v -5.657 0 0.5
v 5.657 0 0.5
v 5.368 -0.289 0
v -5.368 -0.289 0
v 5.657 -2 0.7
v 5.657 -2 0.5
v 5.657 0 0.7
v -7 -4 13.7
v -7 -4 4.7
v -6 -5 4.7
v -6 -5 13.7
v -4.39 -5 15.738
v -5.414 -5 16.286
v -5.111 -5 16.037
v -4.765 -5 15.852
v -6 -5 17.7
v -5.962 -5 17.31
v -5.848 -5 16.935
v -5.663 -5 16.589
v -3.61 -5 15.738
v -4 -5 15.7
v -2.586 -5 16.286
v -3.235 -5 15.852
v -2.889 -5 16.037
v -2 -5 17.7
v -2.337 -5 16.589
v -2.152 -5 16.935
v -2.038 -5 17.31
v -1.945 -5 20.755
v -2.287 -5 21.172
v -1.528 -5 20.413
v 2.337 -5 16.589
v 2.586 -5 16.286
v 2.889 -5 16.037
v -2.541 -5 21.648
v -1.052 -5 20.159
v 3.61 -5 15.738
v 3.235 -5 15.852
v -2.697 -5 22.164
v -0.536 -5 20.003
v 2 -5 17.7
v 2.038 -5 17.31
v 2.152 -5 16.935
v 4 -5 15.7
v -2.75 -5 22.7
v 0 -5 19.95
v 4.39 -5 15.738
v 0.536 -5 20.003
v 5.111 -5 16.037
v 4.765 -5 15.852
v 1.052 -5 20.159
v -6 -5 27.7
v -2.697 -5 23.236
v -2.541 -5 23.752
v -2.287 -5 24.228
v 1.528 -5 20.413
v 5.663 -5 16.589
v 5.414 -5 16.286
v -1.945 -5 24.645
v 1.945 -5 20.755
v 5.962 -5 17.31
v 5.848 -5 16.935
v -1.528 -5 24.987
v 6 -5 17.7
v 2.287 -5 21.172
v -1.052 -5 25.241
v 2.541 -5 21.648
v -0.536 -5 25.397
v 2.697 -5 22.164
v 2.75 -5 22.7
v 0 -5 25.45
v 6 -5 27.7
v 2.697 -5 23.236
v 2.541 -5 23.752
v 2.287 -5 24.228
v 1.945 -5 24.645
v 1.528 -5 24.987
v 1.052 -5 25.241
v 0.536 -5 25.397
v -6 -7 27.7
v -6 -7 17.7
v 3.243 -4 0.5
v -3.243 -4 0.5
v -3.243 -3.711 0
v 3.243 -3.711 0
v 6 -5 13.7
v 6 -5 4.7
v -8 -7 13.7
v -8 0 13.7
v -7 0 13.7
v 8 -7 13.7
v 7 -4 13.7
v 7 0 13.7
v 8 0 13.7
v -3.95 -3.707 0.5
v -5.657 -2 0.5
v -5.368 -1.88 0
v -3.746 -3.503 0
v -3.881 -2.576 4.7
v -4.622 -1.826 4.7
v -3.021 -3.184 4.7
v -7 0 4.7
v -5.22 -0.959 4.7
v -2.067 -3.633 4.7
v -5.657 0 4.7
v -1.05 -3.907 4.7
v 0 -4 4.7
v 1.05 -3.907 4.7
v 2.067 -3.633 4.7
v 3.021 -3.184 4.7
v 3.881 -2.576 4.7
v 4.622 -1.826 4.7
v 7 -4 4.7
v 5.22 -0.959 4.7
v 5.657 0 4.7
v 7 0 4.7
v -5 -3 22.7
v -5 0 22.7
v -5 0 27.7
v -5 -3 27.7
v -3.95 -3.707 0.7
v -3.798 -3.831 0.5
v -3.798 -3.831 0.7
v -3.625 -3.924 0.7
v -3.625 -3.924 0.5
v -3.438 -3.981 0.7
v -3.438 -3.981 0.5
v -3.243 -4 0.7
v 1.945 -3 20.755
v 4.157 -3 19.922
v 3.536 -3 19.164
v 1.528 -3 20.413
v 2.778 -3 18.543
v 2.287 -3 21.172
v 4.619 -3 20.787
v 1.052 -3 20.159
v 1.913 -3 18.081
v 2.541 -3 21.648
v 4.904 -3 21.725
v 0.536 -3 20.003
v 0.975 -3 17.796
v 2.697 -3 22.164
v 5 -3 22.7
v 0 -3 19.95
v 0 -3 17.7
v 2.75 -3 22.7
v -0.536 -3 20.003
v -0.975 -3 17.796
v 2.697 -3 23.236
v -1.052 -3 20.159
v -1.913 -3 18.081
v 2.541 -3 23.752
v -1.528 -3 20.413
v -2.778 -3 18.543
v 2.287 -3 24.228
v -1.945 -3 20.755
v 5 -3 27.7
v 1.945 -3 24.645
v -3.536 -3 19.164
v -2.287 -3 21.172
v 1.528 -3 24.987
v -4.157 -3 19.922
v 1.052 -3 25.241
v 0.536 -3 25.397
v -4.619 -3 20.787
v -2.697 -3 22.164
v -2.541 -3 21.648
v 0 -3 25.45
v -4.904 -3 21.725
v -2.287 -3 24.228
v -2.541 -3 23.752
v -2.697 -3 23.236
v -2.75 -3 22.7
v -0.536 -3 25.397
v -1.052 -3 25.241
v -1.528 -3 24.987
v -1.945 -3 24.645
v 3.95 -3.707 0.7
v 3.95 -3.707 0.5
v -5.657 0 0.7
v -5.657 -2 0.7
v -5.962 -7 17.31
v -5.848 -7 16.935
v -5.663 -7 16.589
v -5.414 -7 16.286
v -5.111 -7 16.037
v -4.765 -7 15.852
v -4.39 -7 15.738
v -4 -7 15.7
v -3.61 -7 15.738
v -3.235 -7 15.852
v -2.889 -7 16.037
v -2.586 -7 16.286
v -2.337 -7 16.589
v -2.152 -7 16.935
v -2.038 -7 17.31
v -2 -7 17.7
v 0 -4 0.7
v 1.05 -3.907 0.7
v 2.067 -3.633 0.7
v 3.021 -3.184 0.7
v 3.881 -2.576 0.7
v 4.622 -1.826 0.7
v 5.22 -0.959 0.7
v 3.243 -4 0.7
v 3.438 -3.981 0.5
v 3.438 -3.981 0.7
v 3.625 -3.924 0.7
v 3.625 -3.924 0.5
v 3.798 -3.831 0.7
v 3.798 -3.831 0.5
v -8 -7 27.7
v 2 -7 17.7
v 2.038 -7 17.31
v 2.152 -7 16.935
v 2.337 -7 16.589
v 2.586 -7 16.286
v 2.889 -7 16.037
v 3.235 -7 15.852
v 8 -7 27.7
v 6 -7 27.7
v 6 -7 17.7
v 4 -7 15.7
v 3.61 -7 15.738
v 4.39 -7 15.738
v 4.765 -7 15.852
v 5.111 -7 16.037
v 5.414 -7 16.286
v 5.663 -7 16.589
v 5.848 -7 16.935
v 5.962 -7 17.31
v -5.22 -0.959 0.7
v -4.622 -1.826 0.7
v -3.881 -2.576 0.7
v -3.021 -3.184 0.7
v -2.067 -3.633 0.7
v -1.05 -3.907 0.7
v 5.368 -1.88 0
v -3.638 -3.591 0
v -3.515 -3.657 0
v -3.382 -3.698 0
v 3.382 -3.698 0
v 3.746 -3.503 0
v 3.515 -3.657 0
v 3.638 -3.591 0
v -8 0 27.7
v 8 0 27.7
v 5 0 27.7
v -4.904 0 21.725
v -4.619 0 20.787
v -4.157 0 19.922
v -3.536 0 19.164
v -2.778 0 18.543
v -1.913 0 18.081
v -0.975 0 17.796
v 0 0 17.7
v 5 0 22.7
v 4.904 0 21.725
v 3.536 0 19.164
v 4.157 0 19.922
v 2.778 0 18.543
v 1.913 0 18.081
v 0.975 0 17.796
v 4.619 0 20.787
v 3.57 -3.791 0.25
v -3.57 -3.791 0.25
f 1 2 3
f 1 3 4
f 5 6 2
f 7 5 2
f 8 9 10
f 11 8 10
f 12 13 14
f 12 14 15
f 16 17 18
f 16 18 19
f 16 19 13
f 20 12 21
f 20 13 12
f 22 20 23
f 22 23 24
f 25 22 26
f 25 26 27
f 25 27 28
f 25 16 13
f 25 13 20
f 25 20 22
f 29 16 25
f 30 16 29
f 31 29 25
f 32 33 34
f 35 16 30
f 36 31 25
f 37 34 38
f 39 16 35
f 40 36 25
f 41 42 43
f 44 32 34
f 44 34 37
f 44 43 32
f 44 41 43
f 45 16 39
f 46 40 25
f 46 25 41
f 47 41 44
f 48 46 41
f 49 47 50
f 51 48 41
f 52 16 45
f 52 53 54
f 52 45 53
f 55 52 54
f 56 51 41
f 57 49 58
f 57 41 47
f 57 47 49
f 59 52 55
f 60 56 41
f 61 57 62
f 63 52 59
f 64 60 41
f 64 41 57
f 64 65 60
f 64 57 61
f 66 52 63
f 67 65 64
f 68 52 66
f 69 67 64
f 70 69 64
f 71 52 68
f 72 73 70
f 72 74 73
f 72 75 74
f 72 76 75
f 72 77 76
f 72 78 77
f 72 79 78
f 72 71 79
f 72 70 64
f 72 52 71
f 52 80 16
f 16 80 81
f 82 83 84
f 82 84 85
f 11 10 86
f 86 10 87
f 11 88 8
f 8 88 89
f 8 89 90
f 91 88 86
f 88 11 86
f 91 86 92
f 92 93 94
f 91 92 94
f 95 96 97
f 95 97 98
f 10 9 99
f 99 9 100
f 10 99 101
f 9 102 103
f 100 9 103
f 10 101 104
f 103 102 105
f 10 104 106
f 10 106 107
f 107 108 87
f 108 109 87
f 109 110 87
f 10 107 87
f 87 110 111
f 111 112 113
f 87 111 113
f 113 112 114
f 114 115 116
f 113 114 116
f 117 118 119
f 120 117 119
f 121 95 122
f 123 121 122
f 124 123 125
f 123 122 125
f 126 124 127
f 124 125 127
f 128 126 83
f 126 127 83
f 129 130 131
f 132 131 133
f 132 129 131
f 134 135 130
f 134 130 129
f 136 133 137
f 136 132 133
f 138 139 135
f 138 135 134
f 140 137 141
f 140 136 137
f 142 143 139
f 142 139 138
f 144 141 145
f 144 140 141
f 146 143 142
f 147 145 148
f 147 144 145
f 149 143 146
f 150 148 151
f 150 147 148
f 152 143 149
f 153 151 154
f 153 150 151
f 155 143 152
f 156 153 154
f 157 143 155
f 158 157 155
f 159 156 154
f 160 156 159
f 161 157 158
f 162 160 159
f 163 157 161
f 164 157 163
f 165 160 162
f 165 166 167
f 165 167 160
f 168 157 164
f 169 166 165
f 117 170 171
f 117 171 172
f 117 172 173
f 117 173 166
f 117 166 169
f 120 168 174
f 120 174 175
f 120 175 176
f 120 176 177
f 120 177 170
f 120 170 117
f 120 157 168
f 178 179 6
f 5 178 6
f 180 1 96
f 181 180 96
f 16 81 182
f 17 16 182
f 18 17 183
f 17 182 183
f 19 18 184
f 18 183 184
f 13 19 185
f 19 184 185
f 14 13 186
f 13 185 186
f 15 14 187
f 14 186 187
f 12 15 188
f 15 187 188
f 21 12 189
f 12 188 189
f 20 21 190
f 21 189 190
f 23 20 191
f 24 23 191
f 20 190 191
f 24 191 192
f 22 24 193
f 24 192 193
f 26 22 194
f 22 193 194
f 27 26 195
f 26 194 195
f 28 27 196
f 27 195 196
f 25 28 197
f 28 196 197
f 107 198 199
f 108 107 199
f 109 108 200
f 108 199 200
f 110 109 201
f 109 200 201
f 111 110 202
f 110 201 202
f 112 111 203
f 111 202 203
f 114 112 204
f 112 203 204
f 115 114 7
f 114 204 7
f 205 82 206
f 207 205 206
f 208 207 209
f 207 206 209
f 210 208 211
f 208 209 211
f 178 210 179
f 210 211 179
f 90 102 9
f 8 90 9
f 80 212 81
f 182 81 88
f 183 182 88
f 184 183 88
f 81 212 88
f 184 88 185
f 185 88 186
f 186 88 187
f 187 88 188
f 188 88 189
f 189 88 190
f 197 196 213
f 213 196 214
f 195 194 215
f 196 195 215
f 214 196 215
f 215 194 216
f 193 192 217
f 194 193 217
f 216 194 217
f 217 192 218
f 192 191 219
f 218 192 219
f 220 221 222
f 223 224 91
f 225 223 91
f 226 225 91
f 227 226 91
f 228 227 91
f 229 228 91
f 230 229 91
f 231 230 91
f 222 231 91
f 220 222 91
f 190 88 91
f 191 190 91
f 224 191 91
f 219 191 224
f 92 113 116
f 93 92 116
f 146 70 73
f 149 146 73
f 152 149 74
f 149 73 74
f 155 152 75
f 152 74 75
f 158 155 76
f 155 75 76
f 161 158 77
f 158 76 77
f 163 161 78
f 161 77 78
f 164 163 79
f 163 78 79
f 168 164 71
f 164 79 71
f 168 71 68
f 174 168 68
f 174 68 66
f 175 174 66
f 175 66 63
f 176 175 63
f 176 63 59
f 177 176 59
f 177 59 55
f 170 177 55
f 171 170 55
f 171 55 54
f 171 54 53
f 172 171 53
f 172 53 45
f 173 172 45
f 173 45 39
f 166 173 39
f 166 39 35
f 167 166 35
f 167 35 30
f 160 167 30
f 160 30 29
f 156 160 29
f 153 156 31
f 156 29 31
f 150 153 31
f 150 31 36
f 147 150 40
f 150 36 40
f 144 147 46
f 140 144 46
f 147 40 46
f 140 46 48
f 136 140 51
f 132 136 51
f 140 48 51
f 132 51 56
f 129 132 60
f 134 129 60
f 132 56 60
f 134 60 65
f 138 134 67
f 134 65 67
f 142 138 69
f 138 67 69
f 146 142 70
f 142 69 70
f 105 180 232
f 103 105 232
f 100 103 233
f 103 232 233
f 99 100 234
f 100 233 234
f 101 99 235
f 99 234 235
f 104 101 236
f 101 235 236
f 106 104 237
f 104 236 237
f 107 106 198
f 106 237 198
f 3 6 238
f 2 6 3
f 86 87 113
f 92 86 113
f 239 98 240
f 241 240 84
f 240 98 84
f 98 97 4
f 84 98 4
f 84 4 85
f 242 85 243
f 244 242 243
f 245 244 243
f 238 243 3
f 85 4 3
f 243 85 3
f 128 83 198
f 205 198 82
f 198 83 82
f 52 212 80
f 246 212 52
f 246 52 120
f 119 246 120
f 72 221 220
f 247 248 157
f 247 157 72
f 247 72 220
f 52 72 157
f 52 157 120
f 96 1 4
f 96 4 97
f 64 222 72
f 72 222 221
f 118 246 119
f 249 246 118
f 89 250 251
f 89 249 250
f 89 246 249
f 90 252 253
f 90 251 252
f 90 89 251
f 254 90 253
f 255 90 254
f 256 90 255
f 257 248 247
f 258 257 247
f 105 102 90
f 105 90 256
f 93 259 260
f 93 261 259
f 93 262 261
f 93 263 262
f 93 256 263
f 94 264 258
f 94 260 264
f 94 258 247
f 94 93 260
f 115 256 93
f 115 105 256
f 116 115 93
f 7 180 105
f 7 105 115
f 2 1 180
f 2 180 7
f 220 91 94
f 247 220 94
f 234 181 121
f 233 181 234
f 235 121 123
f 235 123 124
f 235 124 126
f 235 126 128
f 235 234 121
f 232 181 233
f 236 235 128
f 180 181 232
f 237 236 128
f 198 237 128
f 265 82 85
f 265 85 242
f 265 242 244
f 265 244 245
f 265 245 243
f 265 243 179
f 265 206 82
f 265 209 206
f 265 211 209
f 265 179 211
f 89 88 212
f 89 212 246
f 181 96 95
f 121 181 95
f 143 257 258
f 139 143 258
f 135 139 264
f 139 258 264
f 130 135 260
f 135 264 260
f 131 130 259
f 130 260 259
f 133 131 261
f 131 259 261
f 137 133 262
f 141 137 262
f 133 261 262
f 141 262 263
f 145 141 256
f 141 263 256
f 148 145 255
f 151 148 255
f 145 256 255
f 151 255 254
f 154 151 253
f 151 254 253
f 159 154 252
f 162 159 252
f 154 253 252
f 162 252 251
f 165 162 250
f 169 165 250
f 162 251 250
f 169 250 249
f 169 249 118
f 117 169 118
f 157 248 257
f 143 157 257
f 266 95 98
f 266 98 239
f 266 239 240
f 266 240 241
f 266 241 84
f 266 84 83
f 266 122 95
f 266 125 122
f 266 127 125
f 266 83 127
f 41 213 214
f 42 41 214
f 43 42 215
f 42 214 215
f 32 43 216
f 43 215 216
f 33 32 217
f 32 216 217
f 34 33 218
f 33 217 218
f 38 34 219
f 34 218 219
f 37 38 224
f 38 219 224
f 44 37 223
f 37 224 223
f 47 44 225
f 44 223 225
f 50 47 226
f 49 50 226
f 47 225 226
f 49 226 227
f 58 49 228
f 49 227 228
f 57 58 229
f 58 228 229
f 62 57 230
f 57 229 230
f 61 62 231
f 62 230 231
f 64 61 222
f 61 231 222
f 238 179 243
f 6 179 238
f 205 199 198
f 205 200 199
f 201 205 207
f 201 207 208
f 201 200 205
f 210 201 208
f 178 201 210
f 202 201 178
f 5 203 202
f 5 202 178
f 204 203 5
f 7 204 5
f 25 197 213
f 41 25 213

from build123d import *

# Parameters (mm, degrees)
F1_DEPTH  = 0.7
F3_DEPTH  = 4
F5_DEPTH  = 9
F6_W      = 16
F6_H      = 7
F7_DEPTH  = 14
F8_R      = 2.75
F9_DEPTH  = 7.001
F10_R     = 2.75
F11_DEPTH = 2
F12_R     = 2.75
F13_DEPTH = 3
F14_SIZE2 = 0.5
F14_SIZE  = 0.2886751346


with BuildPart() as f1:
    # F0 (on Top) → F1 (new body)
    with BuildSketch(Plane.XY):
        with BuildLine():
            Line((5.657, 0), (-5.657, 0))
            ThreePointArc((-5.657, 0), (-3.4641611178, -2.8989837358), (0, -4))
            ThreePointArc((0, -4), (3.4641611178, -2.8989837358), (5.657, 0))
        make_face()
        with BuildLine():
            ThreePointArc((0, -4), (-3.4641611178, -2.8989837358), (-5.657, 0))
            Line((-5.657, 0), (-5.657, -2))
            Line((-5.657, -2), (-3.9498932188, -3.7071067812))
            ThreePointArc((-3.9498932188, -3.7071067812), (-3.62546987, -3.9238795325), (-3.2427864376, -4))
            Line((-3.2427864376, -4), (0, -4))
        make_face()
        with BuildLine():
            Line((5.657, -2), (5.657, 0))
            ThreePointArc((5.657, 0), (3.4641611178, -2.8989837358), (0, -4))
            Line((0, -4), (3.2427864376, -4))
            ThreePointArc((3.2427864376, -4), (3.62546987, -3.9238795325), (3.9498932188, -3.7071067812))
            Line((3.9498932188, -3.7071067812), (5.657, -2))
        make_face()
    extrude(amount=F1_DEPTH)

    # F2 (on face) → F3 (join)
    with BuildSketch(Plane.XY.offset(0.7)):
        with BuildLine():
            Line((5.657, 0), (-5.657, 0))
            ThreePointArc((-5.657, 0), (-3.4641611178, -2.8989837358), (0, -4))
            ThreePointArc((0, -4), (3.4641611178, -2.8989837358), (5.657, 0))
        make_face()
    extrude(amount=F3_DEPTH)

    # F4 (on face) → F5 (join)
    with BuildSketch(Plane.XY.offset(4.7)):
        with BuildLine():
            Line((5.657, 0), (-5.657, 0))
            ThreePointArc((-5.657, 0), (0, -4), (5.657, 0))
        make_face()
        with BuildLine():
            Line((-5.657, 0), (-7, 0))
            Line((-7, 0), (-7, -4))
            Line((-7, -4), (-6, -5))
            Line((-6, -5), (6, -5))
            Line((6, -5), (7, -4))
            Line((7, -4), (7, 0))
            Line((7, 0), (5.657, 0))
            ThreePointArc((5.657, 0), (0, -4), (-5.657, 0))
        make_face()
    extrude(amount=F5_DEPTH)

    # F6 (on face) → F7 (join)
    with BuildSketch(Plane.XY.offset(13.7)):
        with Locations((0, -3.5)):
            Rectangle(F6_W, F6_H)
    extrude(amount=F7_DEPTH)

    # F8 (on face) → F9 (cut, through all)
    with BuildSketch(Plane.XZ.offset(7)):
        with Locations((0, 22.7)):
            Circle(F8_R)
    extrude(amount=-F9_DEPTH, mode=Mode.SUBTRACT)

    # F10 (on face) → F11 (cut)
    with BuildSketch(Plane.XZ.offset(7)):
        with BuildLine():
            Line((6, 27.7), (-6, 27.7))
            Line((-6, 27.7), (-6, 17.7))
            ThreePointArc((-6, 17.7), (-4, 15.7), (-2, 17.7))
            Line((-2, 17.7), (2, 17.7))
            ThreePointArc((2, 17.7), (4, 15.7), (6, 17.7))
            Line((6, 17.7), (6, 27.7))
        make_face()
        with Locations((0, 22.7)):
            Circle(F10_R, mode=Mode.SUBTRACT)
    extrude(amount=-F11_DEPTH, mode=Mode.SUBTRACT)

    # F12 (on face) → F13 (cut)
    with BuildSketch(Plane(origin=(0, 0, 0), x_dir=(-1, 0, 0), z_dir=(0, 1, 0))):
        with BuildLine():
            Line((5, 27.7), (-5, 27.7))
            Line((-5, 27.7), (-5, 22.7))
            ThreePointArc((-5, 22.7), (0, 17.7), (5, 22.7))
            Line((5, 22.7), (5, 27.7))
        make_face()
        with Locations((0, 22.7)):
            Circle(F12_R, mode=Mode.SUBTRACT)
    extrude(amount=-F13_DEPTH, mode=Mode.SUBTRACT)

    # F14
    f14_edges = [f1.edges().sort_by_distance(p)[0] for p in [
        (0, 0, 0),
        (-5.657, -1, 0),
        (-4.803447, -2.853553, 0),
        (-3.62547, -3.92388, 0),
        (0, -4, 0),
        (3.62547, -3.92388, 0),
        (4.803447, -2.853553, 0),
        (5.657, -1, 0),
    ]]
    f14_side = f1.faces().sort_by_distance((0, -1.868566, 0))[0]
    chamfer(f14_edges, length=F14_SIZE, length2=F14_SIZE2, reference=f14_side)


solid = f1.part
